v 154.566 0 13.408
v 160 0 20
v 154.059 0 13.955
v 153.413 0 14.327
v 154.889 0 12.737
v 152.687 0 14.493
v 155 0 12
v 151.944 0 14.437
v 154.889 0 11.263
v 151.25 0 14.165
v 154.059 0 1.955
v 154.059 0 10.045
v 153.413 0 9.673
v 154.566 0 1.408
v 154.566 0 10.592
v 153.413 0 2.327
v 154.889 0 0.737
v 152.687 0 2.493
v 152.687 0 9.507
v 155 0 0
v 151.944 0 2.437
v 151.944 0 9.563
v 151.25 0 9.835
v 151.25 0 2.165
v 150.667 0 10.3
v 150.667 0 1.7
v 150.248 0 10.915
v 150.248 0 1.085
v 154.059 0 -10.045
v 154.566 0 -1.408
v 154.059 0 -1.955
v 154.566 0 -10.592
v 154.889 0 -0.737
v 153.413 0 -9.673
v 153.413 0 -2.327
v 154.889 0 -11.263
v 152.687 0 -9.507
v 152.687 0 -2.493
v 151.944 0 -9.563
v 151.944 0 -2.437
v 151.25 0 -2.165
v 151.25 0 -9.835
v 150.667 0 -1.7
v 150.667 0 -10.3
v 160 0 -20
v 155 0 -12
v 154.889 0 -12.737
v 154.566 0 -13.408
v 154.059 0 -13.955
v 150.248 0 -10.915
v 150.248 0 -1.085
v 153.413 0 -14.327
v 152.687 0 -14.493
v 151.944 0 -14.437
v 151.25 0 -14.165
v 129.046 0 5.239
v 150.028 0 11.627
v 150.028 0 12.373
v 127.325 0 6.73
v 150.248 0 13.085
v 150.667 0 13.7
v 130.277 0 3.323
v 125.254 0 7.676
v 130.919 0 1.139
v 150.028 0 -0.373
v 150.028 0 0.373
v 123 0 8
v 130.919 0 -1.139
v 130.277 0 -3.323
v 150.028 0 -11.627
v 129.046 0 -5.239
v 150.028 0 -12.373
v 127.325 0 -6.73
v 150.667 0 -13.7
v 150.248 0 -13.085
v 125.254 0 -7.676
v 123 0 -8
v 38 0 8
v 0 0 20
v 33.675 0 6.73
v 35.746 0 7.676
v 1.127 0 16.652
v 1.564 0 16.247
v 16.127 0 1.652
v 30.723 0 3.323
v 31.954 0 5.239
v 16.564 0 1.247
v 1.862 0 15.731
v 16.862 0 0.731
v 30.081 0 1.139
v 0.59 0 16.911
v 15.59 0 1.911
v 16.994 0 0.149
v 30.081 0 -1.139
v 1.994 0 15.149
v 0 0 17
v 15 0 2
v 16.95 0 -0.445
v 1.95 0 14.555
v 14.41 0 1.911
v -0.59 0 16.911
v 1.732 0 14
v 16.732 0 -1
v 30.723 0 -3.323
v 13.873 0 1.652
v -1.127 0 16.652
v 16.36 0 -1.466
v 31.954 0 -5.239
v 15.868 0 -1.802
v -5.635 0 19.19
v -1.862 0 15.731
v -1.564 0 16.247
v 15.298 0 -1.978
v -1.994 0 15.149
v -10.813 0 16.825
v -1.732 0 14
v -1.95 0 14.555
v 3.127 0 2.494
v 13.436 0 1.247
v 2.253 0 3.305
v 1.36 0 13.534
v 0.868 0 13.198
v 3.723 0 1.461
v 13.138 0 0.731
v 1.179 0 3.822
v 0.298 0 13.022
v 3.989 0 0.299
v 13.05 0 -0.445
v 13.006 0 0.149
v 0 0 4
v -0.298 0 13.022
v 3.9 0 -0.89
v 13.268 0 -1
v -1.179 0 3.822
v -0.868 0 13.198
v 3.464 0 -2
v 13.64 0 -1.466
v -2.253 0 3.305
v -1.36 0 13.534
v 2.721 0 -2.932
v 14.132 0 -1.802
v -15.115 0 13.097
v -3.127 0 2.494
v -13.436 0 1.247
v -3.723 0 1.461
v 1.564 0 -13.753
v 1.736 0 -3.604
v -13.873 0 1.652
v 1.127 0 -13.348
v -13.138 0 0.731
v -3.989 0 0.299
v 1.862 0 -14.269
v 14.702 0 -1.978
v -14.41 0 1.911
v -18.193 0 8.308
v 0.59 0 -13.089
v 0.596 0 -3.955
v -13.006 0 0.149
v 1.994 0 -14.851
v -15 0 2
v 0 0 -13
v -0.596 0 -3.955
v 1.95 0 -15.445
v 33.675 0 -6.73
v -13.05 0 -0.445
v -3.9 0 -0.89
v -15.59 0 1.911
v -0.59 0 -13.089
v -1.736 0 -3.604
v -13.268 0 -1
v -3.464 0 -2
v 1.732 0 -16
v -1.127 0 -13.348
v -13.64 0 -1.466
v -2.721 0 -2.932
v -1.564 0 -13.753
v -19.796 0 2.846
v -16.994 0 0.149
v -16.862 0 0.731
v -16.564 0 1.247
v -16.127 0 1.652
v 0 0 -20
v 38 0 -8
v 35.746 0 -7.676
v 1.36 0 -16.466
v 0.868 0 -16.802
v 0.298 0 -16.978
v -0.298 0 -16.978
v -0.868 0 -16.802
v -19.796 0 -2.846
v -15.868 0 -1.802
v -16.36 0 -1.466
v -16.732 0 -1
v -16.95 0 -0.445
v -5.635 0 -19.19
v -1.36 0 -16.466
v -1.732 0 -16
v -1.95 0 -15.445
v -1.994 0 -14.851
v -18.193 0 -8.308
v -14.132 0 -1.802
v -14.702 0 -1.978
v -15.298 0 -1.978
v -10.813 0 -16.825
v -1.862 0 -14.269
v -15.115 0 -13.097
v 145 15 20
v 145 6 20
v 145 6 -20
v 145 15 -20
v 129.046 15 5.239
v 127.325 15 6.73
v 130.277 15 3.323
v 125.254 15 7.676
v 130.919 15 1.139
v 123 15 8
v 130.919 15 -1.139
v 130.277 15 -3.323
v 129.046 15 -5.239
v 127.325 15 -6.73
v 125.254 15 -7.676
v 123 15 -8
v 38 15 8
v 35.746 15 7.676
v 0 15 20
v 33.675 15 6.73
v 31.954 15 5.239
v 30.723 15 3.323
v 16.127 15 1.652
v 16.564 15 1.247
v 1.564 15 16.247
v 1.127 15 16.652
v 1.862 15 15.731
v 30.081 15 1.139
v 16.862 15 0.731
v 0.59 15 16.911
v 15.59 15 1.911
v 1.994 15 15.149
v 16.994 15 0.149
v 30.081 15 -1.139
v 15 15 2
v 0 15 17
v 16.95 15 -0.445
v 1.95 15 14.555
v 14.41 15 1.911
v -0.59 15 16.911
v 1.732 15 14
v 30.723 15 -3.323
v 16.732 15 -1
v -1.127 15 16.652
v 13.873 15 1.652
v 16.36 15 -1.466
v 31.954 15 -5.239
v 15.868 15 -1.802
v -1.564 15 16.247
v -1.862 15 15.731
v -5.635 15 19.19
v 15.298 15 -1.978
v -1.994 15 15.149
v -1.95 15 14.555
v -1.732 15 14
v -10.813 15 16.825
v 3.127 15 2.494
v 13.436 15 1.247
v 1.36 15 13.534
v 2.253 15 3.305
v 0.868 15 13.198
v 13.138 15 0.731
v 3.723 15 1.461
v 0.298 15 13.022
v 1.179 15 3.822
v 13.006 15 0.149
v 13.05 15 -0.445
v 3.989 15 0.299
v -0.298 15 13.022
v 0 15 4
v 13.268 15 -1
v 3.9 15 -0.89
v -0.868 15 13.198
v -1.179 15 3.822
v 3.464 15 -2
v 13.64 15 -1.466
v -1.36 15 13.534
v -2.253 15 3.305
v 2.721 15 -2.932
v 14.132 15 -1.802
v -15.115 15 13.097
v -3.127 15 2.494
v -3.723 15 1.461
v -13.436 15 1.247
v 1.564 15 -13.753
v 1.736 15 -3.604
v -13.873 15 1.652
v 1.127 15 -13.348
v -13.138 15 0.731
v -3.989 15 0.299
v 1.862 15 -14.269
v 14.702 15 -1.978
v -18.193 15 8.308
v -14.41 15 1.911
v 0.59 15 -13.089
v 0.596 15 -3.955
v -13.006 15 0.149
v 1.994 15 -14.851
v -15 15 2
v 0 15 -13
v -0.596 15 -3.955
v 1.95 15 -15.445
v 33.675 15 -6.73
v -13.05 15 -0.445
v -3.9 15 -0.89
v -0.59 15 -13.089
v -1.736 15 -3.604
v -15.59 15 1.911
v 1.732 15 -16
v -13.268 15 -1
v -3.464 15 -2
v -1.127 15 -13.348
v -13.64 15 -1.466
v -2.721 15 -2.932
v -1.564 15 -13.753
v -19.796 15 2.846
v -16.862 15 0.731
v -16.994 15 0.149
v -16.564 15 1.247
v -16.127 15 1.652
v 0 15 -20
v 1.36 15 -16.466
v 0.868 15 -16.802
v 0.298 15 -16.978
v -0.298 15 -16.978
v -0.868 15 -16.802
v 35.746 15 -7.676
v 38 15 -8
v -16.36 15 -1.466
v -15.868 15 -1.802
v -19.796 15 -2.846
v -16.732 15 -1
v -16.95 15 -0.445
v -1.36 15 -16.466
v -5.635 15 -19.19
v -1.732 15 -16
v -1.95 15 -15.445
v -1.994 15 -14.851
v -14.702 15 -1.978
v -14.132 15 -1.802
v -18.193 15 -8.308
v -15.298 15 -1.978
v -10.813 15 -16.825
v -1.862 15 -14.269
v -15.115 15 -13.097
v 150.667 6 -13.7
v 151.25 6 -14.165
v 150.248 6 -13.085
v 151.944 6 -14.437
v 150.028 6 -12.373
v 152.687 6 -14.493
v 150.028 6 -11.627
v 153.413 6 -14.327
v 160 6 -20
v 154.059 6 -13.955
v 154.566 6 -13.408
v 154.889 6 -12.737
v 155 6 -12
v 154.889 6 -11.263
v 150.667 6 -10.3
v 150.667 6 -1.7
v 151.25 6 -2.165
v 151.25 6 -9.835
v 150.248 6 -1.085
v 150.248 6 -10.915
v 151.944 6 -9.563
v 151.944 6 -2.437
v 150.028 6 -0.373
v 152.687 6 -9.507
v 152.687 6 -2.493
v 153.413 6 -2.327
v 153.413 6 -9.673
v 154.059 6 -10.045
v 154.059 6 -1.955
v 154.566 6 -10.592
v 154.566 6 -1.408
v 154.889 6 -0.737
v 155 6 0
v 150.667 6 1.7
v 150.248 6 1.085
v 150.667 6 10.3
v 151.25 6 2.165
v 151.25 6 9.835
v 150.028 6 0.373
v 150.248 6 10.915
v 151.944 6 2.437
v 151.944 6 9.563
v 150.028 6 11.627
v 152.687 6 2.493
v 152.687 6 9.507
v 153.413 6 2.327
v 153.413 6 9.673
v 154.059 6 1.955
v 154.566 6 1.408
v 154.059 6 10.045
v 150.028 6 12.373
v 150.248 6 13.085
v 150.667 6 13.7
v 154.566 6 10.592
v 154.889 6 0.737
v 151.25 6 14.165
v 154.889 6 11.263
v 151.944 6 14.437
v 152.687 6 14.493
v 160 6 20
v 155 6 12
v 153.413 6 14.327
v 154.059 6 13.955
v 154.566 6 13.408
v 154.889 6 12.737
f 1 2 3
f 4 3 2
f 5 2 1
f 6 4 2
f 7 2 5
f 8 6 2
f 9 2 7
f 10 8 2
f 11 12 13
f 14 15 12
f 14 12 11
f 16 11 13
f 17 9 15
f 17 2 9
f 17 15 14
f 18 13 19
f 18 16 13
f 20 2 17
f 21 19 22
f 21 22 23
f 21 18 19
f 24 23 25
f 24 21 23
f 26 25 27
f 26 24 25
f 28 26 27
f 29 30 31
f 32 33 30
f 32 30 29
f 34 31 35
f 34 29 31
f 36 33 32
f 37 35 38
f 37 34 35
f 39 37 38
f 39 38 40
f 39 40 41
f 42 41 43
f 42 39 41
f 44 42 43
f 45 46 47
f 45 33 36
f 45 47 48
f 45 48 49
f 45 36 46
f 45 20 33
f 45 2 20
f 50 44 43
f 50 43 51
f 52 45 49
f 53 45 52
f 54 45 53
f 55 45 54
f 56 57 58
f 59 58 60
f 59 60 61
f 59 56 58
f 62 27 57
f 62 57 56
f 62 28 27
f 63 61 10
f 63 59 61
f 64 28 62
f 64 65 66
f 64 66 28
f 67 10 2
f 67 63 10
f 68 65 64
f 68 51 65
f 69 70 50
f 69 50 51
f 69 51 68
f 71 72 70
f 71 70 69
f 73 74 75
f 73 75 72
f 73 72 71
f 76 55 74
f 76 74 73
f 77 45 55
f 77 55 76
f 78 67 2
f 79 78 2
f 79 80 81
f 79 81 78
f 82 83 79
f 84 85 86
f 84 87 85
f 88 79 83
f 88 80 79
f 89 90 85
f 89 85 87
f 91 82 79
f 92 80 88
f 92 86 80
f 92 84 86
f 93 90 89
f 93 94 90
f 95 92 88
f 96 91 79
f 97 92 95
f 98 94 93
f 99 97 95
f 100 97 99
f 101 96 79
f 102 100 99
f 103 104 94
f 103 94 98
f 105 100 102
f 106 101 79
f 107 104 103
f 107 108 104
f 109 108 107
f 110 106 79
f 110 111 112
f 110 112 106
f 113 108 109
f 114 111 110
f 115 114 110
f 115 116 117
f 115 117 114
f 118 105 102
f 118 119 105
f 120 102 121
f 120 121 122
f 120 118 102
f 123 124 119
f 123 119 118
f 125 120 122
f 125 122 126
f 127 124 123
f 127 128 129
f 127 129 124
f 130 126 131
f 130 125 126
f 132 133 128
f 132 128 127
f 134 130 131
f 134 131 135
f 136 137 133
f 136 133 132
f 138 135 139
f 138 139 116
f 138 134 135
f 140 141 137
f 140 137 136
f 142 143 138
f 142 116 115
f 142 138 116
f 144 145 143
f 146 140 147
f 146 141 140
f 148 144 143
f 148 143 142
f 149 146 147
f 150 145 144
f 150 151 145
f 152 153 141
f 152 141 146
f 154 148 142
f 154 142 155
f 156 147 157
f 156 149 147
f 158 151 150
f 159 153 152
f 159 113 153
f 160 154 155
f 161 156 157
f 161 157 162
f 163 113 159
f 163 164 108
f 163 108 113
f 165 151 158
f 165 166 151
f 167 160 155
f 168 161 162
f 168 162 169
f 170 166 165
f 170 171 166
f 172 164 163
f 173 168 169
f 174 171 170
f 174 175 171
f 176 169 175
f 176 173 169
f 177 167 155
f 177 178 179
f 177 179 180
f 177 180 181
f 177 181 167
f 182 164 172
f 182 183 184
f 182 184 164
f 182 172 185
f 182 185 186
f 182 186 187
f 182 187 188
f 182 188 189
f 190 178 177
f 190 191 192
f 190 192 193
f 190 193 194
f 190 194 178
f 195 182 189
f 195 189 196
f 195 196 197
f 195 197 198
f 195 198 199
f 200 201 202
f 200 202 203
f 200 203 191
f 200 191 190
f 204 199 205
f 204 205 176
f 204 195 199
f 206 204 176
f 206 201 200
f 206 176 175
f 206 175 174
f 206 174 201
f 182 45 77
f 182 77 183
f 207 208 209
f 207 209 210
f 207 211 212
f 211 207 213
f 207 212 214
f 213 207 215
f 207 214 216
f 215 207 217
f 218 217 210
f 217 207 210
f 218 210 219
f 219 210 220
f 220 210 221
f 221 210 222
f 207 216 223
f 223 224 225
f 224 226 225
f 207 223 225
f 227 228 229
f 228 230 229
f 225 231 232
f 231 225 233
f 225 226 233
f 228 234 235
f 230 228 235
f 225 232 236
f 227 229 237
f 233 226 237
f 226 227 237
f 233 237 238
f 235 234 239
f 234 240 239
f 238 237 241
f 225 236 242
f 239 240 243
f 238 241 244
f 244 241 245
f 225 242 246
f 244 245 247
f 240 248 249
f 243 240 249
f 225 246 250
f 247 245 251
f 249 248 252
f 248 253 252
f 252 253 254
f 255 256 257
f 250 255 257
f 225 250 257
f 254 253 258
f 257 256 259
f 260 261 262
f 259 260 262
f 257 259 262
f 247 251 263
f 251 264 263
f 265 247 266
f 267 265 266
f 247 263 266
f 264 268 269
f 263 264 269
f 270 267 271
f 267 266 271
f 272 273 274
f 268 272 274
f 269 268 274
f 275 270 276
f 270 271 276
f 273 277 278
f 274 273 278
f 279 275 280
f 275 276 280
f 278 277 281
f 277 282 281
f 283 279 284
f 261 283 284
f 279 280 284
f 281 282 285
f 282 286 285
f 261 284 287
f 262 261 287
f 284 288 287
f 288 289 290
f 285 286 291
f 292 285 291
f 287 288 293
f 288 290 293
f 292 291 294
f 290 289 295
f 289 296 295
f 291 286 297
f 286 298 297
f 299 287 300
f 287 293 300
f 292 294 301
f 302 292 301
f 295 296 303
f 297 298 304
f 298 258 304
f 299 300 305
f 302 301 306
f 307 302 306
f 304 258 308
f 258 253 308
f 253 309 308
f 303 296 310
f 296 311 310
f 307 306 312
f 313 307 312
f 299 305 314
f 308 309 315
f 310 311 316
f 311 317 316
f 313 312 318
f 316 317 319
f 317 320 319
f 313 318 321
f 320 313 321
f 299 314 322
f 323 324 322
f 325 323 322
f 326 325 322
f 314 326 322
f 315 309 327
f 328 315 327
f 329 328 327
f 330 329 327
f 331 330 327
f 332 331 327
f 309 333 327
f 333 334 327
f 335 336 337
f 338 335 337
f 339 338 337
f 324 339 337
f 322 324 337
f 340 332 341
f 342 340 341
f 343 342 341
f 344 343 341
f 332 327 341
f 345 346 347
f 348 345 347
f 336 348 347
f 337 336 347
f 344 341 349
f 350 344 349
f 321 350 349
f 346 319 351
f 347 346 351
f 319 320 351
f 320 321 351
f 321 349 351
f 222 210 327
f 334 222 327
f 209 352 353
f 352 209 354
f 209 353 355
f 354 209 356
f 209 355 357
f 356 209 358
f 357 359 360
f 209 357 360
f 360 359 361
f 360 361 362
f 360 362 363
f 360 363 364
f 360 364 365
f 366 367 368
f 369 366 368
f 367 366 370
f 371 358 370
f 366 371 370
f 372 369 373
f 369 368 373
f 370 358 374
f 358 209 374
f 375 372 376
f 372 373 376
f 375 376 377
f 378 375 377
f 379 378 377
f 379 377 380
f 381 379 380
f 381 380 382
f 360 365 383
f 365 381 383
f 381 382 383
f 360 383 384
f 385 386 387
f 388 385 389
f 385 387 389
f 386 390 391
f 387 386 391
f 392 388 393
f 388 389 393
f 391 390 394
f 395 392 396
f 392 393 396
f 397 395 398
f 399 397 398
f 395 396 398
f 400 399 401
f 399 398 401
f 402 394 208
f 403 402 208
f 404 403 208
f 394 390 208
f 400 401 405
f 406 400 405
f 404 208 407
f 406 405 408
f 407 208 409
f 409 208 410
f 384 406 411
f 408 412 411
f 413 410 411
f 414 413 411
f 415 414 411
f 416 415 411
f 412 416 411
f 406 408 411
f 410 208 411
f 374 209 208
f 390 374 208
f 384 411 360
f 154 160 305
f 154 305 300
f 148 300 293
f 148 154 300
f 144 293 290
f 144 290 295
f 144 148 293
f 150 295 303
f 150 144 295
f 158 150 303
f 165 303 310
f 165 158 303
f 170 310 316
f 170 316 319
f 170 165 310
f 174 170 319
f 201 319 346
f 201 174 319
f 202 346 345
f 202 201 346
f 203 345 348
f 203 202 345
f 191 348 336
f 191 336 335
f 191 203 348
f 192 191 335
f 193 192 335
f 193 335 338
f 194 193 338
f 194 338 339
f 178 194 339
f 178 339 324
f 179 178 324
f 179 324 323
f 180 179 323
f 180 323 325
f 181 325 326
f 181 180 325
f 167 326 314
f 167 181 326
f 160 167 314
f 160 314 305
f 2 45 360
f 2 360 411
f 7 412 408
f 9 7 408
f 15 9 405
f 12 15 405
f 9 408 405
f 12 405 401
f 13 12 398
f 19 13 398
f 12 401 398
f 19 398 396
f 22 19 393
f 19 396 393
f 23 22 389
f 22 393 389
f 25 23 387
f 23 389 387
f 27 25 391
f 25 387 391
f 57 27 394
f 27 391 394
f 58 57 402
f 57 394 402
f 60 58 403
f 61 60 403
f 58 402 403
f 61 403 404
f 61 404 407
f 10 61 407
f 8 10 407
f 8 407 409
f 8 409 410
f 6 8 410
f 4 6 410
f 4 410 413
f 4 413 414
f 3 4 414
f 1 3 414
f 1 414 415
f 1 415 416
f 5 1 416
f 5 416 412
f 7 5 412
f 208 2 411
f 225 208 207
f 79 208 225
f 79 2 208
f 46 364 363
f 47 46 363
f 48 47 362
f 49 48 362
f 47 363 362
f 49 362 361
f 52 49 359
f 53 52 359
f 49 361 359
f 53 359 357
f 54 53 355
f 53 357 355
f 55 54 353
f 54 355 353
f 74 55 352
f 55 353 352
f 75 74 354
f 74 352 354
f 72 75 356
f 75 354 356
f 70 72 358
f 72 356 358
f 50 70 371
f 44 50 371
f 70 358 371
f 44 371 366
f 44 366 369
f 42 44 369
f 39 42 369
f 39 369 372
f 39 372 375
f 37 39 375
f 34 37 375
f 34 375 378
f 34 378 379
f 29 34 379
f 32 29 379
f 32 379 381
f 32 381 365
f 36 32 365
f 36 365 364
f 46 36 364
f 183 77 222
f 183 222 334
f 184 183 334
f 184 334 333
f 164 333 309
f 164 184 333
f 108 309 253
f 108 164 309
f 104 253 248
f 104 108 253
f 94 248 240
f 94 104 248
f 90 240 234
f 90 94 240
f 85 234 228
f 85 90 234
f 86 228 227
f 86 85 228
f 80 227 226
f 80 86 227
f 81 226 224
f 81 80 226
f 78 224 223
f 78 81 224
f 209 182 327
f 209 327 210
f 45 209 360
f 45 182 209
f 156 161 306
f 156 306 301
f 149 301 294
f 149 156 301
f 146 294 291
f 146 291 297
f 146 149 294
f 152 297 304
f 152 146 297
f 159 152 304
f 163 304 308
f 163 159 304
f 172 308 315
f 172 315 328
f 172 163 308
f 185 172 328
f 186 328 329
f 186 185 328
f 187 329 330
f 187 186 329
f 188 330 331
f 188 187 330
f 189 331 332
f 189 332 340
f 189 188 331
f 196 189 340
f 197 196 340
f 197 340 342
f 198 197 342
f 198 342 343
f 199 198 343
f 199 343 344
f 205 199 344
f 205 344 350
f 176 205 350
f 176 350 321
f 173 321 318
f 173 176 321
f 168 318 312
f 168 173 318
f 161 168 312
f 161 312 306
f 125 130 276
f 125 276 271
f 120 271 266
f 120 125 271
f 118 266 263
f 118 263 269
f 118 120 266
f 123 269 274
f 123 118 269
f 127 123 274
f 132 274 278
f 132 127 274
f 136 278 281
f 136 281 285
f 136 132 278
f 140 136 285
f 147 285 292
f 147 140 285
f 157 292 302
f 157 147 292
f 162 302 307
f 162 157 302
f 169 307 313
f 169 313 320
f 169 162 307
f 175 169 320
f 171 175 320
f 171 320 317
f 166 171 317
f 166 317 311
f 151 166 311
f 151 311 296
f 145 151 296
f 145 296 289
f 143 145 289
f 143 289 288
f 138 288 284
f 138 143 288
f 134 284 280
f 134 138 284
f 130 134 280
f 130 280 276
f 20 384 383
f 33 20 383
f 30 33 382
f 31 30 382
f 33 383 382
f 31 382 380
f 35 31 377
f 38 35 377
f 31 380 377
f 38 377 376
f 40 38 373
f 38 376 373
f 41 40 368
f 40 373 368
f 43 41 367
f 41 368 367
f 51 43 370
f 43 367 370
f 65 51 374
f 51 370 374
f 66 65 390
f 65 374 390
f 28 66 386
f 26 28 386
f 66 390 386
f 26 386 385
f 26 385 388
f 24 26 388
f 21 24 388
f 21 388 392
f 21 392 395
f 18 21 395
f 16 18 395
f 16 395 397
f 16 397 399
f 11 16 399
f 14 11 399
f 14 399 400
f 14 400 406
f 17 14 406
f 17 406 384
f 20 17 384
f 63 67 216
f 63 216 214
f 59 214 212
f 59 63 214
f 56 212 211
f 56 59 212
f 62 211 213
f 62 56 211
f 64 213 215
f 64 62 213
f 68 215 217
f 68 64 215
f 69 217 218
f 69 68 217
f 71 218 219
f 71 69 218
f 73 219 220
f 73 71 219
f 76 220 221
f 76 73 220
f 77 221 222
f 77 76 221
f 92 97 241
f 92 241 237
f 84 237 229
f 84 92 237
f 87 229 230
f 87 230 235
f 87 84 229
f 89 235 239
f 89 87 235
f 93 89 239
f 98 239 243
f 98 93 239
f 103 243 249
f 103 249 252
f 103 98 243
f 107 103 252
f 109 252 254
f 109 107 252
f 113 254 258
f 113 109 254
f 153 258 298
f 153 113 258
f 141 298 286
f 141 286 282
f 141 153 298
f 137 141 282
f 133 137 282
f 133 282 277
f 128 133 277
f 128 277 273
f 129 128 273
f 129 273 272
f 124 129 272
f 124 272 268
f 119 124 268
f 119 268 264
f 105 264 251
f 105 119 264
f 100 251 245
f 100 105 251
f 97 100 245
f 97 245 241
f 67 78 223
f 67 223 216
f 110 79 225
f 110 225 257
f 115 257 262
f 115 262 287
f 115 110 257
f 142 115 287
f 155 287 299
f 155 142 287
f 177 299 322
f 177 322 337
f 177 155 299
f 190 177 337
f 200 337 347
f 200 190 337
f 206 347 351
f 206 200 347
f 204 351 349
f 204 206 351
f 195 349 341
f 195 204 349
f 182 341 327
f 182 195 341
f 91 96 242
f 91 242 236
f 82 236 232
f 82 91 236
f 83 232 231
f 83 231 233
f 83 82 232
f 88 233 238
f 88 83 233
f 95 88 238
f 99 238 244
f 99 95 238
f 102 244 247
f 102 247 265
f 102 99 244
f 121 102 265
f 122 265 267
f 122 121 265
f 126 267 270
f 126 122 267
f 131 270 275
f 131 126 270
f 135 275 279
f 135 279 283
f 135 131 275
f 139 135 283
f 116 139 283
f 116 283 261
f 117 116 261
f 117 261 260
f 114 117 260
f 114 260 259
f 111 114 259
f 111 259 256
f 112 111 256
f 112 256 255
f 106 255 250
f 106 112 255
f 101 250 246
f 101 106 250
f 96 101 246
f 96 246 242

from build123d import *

# Parameters (mm, degrees)
SKETCH_1_R            = 2
SKETCH_1_R_2          = 4
EXTRUDE_1_DEPTH       = 15
CUT_EXTRUDE_1_REACH   = 167.605
SKETCH_2_W            = 15
SKETCH_2_H            = 9
HOLE_WIZARD_5_0_5_1_D = 5
CUT_EXTRUDE_2_REACH   = 163.941


with BuildPart() as part:
    # 草图1 → 凸台-拉伸1 (new body)
    with BuildSketch(Plane(origin=(0, 0, 0), x_dir=(1, 0, 0), z_dir=(0, 1, 0))):
        with BuildLine():
            Line((0, 20), (160, 20))
            Line((160, 20), (160, -20))
            Line((160, -20), (0, -20))
            ThreePointArc((0, -20), (-20, 0), (0, 20))
        make_face()
        with Locations(Location((0, 15, 0), (0, 0, 270))):
            Circle(SKETCH_1_R, mode=Mode.SUBTRACT)
        with Locations(Location((15, 0, 0), (0, 0, 270))):
            Circle(SKETCH_1_R, mode=Mode.SUBTRACT)
        with Locations(Location((0, -15, 0), (0, 0, 270))):
            Circle(SKETCH_1_R, mode=Mode.SUBTRACT)
        with Locations(Location((-15, 0, 0), (0, 0, 270))):
            Circle(SKETCH_1_R, mode=Mode.SUBTRACT)
        with Locations(Location((0, 0, 0), (0, 0, 270))):
            Circle(SKETCH_1_R_2, mode=Mode.SUBTRACT)
    extrude(amount=EXTRUDE_1_DEPTH)

    # 草图2 → 切除-拉伸1 (cut, up to next)
    with BuildSketch(Plane.XY.offset(20), mode=Mode.PRIVATE) as cut_extrude_1_sk1:
        with Locations((152.5, 10.5)):
            Rectangle(SKETCH_2_W, SKETCH_2_H)
    cut_extrude_1_tool1 = extrude(cut_extrude_1_sk1.sketch, amount=-CUT_EXTRUDE_1_REACH, mode=Mode.PRIVATE) & part.part
    add(cut_extrude_1_tool1.solids().sort_by_distance((152.5, 10.5, 20))[0], mode=Mode.SUBTRACT)

    # Ø5.0 (5) 直径孔1 (through all)
    with Locations(Plane(origin=(0, 0, 0), x_dir=(-1, 0, 0), z_dir=(0, -1, 0))):
        with Locations((-152.5, -12), (-152.5, 0), (-152.5, 12)):
            Hole(HOLE_WIZARD_5_0_5_1_D / 2)

    # 草图6 → 切除-拉伸2 (cut, up to next)
    with BuildSketch(Plane(origin=(0, 0, 0), x_dir=(1, 0, 0), z_dir=(0, 1, 0)), mode=Mode.PRIVATE) as cut_extrude_2_sk1:
        with BuildLine():
            Line((38, -8), (123, -8))
            ThreePointArc((123, -8), (131, 0), (123, 8))
            Line((123, 8), (38, 8))
            ThreePointArc((38, 8), (30, 0), (38, -8))
        make_face()
    cut_extrude_2_tool1 = extrude(cut_extrude_2_sk1.sketch, amount=CUT_EXTRUDE_2_REACH, mode=Mode.PRIVATE) & part.part
    add(cut_extrude_2_tool1.solids().sort_by_distance((80.5, 0, 0))[0], mode=Mode.SUBTRACT)


solid = part.part
